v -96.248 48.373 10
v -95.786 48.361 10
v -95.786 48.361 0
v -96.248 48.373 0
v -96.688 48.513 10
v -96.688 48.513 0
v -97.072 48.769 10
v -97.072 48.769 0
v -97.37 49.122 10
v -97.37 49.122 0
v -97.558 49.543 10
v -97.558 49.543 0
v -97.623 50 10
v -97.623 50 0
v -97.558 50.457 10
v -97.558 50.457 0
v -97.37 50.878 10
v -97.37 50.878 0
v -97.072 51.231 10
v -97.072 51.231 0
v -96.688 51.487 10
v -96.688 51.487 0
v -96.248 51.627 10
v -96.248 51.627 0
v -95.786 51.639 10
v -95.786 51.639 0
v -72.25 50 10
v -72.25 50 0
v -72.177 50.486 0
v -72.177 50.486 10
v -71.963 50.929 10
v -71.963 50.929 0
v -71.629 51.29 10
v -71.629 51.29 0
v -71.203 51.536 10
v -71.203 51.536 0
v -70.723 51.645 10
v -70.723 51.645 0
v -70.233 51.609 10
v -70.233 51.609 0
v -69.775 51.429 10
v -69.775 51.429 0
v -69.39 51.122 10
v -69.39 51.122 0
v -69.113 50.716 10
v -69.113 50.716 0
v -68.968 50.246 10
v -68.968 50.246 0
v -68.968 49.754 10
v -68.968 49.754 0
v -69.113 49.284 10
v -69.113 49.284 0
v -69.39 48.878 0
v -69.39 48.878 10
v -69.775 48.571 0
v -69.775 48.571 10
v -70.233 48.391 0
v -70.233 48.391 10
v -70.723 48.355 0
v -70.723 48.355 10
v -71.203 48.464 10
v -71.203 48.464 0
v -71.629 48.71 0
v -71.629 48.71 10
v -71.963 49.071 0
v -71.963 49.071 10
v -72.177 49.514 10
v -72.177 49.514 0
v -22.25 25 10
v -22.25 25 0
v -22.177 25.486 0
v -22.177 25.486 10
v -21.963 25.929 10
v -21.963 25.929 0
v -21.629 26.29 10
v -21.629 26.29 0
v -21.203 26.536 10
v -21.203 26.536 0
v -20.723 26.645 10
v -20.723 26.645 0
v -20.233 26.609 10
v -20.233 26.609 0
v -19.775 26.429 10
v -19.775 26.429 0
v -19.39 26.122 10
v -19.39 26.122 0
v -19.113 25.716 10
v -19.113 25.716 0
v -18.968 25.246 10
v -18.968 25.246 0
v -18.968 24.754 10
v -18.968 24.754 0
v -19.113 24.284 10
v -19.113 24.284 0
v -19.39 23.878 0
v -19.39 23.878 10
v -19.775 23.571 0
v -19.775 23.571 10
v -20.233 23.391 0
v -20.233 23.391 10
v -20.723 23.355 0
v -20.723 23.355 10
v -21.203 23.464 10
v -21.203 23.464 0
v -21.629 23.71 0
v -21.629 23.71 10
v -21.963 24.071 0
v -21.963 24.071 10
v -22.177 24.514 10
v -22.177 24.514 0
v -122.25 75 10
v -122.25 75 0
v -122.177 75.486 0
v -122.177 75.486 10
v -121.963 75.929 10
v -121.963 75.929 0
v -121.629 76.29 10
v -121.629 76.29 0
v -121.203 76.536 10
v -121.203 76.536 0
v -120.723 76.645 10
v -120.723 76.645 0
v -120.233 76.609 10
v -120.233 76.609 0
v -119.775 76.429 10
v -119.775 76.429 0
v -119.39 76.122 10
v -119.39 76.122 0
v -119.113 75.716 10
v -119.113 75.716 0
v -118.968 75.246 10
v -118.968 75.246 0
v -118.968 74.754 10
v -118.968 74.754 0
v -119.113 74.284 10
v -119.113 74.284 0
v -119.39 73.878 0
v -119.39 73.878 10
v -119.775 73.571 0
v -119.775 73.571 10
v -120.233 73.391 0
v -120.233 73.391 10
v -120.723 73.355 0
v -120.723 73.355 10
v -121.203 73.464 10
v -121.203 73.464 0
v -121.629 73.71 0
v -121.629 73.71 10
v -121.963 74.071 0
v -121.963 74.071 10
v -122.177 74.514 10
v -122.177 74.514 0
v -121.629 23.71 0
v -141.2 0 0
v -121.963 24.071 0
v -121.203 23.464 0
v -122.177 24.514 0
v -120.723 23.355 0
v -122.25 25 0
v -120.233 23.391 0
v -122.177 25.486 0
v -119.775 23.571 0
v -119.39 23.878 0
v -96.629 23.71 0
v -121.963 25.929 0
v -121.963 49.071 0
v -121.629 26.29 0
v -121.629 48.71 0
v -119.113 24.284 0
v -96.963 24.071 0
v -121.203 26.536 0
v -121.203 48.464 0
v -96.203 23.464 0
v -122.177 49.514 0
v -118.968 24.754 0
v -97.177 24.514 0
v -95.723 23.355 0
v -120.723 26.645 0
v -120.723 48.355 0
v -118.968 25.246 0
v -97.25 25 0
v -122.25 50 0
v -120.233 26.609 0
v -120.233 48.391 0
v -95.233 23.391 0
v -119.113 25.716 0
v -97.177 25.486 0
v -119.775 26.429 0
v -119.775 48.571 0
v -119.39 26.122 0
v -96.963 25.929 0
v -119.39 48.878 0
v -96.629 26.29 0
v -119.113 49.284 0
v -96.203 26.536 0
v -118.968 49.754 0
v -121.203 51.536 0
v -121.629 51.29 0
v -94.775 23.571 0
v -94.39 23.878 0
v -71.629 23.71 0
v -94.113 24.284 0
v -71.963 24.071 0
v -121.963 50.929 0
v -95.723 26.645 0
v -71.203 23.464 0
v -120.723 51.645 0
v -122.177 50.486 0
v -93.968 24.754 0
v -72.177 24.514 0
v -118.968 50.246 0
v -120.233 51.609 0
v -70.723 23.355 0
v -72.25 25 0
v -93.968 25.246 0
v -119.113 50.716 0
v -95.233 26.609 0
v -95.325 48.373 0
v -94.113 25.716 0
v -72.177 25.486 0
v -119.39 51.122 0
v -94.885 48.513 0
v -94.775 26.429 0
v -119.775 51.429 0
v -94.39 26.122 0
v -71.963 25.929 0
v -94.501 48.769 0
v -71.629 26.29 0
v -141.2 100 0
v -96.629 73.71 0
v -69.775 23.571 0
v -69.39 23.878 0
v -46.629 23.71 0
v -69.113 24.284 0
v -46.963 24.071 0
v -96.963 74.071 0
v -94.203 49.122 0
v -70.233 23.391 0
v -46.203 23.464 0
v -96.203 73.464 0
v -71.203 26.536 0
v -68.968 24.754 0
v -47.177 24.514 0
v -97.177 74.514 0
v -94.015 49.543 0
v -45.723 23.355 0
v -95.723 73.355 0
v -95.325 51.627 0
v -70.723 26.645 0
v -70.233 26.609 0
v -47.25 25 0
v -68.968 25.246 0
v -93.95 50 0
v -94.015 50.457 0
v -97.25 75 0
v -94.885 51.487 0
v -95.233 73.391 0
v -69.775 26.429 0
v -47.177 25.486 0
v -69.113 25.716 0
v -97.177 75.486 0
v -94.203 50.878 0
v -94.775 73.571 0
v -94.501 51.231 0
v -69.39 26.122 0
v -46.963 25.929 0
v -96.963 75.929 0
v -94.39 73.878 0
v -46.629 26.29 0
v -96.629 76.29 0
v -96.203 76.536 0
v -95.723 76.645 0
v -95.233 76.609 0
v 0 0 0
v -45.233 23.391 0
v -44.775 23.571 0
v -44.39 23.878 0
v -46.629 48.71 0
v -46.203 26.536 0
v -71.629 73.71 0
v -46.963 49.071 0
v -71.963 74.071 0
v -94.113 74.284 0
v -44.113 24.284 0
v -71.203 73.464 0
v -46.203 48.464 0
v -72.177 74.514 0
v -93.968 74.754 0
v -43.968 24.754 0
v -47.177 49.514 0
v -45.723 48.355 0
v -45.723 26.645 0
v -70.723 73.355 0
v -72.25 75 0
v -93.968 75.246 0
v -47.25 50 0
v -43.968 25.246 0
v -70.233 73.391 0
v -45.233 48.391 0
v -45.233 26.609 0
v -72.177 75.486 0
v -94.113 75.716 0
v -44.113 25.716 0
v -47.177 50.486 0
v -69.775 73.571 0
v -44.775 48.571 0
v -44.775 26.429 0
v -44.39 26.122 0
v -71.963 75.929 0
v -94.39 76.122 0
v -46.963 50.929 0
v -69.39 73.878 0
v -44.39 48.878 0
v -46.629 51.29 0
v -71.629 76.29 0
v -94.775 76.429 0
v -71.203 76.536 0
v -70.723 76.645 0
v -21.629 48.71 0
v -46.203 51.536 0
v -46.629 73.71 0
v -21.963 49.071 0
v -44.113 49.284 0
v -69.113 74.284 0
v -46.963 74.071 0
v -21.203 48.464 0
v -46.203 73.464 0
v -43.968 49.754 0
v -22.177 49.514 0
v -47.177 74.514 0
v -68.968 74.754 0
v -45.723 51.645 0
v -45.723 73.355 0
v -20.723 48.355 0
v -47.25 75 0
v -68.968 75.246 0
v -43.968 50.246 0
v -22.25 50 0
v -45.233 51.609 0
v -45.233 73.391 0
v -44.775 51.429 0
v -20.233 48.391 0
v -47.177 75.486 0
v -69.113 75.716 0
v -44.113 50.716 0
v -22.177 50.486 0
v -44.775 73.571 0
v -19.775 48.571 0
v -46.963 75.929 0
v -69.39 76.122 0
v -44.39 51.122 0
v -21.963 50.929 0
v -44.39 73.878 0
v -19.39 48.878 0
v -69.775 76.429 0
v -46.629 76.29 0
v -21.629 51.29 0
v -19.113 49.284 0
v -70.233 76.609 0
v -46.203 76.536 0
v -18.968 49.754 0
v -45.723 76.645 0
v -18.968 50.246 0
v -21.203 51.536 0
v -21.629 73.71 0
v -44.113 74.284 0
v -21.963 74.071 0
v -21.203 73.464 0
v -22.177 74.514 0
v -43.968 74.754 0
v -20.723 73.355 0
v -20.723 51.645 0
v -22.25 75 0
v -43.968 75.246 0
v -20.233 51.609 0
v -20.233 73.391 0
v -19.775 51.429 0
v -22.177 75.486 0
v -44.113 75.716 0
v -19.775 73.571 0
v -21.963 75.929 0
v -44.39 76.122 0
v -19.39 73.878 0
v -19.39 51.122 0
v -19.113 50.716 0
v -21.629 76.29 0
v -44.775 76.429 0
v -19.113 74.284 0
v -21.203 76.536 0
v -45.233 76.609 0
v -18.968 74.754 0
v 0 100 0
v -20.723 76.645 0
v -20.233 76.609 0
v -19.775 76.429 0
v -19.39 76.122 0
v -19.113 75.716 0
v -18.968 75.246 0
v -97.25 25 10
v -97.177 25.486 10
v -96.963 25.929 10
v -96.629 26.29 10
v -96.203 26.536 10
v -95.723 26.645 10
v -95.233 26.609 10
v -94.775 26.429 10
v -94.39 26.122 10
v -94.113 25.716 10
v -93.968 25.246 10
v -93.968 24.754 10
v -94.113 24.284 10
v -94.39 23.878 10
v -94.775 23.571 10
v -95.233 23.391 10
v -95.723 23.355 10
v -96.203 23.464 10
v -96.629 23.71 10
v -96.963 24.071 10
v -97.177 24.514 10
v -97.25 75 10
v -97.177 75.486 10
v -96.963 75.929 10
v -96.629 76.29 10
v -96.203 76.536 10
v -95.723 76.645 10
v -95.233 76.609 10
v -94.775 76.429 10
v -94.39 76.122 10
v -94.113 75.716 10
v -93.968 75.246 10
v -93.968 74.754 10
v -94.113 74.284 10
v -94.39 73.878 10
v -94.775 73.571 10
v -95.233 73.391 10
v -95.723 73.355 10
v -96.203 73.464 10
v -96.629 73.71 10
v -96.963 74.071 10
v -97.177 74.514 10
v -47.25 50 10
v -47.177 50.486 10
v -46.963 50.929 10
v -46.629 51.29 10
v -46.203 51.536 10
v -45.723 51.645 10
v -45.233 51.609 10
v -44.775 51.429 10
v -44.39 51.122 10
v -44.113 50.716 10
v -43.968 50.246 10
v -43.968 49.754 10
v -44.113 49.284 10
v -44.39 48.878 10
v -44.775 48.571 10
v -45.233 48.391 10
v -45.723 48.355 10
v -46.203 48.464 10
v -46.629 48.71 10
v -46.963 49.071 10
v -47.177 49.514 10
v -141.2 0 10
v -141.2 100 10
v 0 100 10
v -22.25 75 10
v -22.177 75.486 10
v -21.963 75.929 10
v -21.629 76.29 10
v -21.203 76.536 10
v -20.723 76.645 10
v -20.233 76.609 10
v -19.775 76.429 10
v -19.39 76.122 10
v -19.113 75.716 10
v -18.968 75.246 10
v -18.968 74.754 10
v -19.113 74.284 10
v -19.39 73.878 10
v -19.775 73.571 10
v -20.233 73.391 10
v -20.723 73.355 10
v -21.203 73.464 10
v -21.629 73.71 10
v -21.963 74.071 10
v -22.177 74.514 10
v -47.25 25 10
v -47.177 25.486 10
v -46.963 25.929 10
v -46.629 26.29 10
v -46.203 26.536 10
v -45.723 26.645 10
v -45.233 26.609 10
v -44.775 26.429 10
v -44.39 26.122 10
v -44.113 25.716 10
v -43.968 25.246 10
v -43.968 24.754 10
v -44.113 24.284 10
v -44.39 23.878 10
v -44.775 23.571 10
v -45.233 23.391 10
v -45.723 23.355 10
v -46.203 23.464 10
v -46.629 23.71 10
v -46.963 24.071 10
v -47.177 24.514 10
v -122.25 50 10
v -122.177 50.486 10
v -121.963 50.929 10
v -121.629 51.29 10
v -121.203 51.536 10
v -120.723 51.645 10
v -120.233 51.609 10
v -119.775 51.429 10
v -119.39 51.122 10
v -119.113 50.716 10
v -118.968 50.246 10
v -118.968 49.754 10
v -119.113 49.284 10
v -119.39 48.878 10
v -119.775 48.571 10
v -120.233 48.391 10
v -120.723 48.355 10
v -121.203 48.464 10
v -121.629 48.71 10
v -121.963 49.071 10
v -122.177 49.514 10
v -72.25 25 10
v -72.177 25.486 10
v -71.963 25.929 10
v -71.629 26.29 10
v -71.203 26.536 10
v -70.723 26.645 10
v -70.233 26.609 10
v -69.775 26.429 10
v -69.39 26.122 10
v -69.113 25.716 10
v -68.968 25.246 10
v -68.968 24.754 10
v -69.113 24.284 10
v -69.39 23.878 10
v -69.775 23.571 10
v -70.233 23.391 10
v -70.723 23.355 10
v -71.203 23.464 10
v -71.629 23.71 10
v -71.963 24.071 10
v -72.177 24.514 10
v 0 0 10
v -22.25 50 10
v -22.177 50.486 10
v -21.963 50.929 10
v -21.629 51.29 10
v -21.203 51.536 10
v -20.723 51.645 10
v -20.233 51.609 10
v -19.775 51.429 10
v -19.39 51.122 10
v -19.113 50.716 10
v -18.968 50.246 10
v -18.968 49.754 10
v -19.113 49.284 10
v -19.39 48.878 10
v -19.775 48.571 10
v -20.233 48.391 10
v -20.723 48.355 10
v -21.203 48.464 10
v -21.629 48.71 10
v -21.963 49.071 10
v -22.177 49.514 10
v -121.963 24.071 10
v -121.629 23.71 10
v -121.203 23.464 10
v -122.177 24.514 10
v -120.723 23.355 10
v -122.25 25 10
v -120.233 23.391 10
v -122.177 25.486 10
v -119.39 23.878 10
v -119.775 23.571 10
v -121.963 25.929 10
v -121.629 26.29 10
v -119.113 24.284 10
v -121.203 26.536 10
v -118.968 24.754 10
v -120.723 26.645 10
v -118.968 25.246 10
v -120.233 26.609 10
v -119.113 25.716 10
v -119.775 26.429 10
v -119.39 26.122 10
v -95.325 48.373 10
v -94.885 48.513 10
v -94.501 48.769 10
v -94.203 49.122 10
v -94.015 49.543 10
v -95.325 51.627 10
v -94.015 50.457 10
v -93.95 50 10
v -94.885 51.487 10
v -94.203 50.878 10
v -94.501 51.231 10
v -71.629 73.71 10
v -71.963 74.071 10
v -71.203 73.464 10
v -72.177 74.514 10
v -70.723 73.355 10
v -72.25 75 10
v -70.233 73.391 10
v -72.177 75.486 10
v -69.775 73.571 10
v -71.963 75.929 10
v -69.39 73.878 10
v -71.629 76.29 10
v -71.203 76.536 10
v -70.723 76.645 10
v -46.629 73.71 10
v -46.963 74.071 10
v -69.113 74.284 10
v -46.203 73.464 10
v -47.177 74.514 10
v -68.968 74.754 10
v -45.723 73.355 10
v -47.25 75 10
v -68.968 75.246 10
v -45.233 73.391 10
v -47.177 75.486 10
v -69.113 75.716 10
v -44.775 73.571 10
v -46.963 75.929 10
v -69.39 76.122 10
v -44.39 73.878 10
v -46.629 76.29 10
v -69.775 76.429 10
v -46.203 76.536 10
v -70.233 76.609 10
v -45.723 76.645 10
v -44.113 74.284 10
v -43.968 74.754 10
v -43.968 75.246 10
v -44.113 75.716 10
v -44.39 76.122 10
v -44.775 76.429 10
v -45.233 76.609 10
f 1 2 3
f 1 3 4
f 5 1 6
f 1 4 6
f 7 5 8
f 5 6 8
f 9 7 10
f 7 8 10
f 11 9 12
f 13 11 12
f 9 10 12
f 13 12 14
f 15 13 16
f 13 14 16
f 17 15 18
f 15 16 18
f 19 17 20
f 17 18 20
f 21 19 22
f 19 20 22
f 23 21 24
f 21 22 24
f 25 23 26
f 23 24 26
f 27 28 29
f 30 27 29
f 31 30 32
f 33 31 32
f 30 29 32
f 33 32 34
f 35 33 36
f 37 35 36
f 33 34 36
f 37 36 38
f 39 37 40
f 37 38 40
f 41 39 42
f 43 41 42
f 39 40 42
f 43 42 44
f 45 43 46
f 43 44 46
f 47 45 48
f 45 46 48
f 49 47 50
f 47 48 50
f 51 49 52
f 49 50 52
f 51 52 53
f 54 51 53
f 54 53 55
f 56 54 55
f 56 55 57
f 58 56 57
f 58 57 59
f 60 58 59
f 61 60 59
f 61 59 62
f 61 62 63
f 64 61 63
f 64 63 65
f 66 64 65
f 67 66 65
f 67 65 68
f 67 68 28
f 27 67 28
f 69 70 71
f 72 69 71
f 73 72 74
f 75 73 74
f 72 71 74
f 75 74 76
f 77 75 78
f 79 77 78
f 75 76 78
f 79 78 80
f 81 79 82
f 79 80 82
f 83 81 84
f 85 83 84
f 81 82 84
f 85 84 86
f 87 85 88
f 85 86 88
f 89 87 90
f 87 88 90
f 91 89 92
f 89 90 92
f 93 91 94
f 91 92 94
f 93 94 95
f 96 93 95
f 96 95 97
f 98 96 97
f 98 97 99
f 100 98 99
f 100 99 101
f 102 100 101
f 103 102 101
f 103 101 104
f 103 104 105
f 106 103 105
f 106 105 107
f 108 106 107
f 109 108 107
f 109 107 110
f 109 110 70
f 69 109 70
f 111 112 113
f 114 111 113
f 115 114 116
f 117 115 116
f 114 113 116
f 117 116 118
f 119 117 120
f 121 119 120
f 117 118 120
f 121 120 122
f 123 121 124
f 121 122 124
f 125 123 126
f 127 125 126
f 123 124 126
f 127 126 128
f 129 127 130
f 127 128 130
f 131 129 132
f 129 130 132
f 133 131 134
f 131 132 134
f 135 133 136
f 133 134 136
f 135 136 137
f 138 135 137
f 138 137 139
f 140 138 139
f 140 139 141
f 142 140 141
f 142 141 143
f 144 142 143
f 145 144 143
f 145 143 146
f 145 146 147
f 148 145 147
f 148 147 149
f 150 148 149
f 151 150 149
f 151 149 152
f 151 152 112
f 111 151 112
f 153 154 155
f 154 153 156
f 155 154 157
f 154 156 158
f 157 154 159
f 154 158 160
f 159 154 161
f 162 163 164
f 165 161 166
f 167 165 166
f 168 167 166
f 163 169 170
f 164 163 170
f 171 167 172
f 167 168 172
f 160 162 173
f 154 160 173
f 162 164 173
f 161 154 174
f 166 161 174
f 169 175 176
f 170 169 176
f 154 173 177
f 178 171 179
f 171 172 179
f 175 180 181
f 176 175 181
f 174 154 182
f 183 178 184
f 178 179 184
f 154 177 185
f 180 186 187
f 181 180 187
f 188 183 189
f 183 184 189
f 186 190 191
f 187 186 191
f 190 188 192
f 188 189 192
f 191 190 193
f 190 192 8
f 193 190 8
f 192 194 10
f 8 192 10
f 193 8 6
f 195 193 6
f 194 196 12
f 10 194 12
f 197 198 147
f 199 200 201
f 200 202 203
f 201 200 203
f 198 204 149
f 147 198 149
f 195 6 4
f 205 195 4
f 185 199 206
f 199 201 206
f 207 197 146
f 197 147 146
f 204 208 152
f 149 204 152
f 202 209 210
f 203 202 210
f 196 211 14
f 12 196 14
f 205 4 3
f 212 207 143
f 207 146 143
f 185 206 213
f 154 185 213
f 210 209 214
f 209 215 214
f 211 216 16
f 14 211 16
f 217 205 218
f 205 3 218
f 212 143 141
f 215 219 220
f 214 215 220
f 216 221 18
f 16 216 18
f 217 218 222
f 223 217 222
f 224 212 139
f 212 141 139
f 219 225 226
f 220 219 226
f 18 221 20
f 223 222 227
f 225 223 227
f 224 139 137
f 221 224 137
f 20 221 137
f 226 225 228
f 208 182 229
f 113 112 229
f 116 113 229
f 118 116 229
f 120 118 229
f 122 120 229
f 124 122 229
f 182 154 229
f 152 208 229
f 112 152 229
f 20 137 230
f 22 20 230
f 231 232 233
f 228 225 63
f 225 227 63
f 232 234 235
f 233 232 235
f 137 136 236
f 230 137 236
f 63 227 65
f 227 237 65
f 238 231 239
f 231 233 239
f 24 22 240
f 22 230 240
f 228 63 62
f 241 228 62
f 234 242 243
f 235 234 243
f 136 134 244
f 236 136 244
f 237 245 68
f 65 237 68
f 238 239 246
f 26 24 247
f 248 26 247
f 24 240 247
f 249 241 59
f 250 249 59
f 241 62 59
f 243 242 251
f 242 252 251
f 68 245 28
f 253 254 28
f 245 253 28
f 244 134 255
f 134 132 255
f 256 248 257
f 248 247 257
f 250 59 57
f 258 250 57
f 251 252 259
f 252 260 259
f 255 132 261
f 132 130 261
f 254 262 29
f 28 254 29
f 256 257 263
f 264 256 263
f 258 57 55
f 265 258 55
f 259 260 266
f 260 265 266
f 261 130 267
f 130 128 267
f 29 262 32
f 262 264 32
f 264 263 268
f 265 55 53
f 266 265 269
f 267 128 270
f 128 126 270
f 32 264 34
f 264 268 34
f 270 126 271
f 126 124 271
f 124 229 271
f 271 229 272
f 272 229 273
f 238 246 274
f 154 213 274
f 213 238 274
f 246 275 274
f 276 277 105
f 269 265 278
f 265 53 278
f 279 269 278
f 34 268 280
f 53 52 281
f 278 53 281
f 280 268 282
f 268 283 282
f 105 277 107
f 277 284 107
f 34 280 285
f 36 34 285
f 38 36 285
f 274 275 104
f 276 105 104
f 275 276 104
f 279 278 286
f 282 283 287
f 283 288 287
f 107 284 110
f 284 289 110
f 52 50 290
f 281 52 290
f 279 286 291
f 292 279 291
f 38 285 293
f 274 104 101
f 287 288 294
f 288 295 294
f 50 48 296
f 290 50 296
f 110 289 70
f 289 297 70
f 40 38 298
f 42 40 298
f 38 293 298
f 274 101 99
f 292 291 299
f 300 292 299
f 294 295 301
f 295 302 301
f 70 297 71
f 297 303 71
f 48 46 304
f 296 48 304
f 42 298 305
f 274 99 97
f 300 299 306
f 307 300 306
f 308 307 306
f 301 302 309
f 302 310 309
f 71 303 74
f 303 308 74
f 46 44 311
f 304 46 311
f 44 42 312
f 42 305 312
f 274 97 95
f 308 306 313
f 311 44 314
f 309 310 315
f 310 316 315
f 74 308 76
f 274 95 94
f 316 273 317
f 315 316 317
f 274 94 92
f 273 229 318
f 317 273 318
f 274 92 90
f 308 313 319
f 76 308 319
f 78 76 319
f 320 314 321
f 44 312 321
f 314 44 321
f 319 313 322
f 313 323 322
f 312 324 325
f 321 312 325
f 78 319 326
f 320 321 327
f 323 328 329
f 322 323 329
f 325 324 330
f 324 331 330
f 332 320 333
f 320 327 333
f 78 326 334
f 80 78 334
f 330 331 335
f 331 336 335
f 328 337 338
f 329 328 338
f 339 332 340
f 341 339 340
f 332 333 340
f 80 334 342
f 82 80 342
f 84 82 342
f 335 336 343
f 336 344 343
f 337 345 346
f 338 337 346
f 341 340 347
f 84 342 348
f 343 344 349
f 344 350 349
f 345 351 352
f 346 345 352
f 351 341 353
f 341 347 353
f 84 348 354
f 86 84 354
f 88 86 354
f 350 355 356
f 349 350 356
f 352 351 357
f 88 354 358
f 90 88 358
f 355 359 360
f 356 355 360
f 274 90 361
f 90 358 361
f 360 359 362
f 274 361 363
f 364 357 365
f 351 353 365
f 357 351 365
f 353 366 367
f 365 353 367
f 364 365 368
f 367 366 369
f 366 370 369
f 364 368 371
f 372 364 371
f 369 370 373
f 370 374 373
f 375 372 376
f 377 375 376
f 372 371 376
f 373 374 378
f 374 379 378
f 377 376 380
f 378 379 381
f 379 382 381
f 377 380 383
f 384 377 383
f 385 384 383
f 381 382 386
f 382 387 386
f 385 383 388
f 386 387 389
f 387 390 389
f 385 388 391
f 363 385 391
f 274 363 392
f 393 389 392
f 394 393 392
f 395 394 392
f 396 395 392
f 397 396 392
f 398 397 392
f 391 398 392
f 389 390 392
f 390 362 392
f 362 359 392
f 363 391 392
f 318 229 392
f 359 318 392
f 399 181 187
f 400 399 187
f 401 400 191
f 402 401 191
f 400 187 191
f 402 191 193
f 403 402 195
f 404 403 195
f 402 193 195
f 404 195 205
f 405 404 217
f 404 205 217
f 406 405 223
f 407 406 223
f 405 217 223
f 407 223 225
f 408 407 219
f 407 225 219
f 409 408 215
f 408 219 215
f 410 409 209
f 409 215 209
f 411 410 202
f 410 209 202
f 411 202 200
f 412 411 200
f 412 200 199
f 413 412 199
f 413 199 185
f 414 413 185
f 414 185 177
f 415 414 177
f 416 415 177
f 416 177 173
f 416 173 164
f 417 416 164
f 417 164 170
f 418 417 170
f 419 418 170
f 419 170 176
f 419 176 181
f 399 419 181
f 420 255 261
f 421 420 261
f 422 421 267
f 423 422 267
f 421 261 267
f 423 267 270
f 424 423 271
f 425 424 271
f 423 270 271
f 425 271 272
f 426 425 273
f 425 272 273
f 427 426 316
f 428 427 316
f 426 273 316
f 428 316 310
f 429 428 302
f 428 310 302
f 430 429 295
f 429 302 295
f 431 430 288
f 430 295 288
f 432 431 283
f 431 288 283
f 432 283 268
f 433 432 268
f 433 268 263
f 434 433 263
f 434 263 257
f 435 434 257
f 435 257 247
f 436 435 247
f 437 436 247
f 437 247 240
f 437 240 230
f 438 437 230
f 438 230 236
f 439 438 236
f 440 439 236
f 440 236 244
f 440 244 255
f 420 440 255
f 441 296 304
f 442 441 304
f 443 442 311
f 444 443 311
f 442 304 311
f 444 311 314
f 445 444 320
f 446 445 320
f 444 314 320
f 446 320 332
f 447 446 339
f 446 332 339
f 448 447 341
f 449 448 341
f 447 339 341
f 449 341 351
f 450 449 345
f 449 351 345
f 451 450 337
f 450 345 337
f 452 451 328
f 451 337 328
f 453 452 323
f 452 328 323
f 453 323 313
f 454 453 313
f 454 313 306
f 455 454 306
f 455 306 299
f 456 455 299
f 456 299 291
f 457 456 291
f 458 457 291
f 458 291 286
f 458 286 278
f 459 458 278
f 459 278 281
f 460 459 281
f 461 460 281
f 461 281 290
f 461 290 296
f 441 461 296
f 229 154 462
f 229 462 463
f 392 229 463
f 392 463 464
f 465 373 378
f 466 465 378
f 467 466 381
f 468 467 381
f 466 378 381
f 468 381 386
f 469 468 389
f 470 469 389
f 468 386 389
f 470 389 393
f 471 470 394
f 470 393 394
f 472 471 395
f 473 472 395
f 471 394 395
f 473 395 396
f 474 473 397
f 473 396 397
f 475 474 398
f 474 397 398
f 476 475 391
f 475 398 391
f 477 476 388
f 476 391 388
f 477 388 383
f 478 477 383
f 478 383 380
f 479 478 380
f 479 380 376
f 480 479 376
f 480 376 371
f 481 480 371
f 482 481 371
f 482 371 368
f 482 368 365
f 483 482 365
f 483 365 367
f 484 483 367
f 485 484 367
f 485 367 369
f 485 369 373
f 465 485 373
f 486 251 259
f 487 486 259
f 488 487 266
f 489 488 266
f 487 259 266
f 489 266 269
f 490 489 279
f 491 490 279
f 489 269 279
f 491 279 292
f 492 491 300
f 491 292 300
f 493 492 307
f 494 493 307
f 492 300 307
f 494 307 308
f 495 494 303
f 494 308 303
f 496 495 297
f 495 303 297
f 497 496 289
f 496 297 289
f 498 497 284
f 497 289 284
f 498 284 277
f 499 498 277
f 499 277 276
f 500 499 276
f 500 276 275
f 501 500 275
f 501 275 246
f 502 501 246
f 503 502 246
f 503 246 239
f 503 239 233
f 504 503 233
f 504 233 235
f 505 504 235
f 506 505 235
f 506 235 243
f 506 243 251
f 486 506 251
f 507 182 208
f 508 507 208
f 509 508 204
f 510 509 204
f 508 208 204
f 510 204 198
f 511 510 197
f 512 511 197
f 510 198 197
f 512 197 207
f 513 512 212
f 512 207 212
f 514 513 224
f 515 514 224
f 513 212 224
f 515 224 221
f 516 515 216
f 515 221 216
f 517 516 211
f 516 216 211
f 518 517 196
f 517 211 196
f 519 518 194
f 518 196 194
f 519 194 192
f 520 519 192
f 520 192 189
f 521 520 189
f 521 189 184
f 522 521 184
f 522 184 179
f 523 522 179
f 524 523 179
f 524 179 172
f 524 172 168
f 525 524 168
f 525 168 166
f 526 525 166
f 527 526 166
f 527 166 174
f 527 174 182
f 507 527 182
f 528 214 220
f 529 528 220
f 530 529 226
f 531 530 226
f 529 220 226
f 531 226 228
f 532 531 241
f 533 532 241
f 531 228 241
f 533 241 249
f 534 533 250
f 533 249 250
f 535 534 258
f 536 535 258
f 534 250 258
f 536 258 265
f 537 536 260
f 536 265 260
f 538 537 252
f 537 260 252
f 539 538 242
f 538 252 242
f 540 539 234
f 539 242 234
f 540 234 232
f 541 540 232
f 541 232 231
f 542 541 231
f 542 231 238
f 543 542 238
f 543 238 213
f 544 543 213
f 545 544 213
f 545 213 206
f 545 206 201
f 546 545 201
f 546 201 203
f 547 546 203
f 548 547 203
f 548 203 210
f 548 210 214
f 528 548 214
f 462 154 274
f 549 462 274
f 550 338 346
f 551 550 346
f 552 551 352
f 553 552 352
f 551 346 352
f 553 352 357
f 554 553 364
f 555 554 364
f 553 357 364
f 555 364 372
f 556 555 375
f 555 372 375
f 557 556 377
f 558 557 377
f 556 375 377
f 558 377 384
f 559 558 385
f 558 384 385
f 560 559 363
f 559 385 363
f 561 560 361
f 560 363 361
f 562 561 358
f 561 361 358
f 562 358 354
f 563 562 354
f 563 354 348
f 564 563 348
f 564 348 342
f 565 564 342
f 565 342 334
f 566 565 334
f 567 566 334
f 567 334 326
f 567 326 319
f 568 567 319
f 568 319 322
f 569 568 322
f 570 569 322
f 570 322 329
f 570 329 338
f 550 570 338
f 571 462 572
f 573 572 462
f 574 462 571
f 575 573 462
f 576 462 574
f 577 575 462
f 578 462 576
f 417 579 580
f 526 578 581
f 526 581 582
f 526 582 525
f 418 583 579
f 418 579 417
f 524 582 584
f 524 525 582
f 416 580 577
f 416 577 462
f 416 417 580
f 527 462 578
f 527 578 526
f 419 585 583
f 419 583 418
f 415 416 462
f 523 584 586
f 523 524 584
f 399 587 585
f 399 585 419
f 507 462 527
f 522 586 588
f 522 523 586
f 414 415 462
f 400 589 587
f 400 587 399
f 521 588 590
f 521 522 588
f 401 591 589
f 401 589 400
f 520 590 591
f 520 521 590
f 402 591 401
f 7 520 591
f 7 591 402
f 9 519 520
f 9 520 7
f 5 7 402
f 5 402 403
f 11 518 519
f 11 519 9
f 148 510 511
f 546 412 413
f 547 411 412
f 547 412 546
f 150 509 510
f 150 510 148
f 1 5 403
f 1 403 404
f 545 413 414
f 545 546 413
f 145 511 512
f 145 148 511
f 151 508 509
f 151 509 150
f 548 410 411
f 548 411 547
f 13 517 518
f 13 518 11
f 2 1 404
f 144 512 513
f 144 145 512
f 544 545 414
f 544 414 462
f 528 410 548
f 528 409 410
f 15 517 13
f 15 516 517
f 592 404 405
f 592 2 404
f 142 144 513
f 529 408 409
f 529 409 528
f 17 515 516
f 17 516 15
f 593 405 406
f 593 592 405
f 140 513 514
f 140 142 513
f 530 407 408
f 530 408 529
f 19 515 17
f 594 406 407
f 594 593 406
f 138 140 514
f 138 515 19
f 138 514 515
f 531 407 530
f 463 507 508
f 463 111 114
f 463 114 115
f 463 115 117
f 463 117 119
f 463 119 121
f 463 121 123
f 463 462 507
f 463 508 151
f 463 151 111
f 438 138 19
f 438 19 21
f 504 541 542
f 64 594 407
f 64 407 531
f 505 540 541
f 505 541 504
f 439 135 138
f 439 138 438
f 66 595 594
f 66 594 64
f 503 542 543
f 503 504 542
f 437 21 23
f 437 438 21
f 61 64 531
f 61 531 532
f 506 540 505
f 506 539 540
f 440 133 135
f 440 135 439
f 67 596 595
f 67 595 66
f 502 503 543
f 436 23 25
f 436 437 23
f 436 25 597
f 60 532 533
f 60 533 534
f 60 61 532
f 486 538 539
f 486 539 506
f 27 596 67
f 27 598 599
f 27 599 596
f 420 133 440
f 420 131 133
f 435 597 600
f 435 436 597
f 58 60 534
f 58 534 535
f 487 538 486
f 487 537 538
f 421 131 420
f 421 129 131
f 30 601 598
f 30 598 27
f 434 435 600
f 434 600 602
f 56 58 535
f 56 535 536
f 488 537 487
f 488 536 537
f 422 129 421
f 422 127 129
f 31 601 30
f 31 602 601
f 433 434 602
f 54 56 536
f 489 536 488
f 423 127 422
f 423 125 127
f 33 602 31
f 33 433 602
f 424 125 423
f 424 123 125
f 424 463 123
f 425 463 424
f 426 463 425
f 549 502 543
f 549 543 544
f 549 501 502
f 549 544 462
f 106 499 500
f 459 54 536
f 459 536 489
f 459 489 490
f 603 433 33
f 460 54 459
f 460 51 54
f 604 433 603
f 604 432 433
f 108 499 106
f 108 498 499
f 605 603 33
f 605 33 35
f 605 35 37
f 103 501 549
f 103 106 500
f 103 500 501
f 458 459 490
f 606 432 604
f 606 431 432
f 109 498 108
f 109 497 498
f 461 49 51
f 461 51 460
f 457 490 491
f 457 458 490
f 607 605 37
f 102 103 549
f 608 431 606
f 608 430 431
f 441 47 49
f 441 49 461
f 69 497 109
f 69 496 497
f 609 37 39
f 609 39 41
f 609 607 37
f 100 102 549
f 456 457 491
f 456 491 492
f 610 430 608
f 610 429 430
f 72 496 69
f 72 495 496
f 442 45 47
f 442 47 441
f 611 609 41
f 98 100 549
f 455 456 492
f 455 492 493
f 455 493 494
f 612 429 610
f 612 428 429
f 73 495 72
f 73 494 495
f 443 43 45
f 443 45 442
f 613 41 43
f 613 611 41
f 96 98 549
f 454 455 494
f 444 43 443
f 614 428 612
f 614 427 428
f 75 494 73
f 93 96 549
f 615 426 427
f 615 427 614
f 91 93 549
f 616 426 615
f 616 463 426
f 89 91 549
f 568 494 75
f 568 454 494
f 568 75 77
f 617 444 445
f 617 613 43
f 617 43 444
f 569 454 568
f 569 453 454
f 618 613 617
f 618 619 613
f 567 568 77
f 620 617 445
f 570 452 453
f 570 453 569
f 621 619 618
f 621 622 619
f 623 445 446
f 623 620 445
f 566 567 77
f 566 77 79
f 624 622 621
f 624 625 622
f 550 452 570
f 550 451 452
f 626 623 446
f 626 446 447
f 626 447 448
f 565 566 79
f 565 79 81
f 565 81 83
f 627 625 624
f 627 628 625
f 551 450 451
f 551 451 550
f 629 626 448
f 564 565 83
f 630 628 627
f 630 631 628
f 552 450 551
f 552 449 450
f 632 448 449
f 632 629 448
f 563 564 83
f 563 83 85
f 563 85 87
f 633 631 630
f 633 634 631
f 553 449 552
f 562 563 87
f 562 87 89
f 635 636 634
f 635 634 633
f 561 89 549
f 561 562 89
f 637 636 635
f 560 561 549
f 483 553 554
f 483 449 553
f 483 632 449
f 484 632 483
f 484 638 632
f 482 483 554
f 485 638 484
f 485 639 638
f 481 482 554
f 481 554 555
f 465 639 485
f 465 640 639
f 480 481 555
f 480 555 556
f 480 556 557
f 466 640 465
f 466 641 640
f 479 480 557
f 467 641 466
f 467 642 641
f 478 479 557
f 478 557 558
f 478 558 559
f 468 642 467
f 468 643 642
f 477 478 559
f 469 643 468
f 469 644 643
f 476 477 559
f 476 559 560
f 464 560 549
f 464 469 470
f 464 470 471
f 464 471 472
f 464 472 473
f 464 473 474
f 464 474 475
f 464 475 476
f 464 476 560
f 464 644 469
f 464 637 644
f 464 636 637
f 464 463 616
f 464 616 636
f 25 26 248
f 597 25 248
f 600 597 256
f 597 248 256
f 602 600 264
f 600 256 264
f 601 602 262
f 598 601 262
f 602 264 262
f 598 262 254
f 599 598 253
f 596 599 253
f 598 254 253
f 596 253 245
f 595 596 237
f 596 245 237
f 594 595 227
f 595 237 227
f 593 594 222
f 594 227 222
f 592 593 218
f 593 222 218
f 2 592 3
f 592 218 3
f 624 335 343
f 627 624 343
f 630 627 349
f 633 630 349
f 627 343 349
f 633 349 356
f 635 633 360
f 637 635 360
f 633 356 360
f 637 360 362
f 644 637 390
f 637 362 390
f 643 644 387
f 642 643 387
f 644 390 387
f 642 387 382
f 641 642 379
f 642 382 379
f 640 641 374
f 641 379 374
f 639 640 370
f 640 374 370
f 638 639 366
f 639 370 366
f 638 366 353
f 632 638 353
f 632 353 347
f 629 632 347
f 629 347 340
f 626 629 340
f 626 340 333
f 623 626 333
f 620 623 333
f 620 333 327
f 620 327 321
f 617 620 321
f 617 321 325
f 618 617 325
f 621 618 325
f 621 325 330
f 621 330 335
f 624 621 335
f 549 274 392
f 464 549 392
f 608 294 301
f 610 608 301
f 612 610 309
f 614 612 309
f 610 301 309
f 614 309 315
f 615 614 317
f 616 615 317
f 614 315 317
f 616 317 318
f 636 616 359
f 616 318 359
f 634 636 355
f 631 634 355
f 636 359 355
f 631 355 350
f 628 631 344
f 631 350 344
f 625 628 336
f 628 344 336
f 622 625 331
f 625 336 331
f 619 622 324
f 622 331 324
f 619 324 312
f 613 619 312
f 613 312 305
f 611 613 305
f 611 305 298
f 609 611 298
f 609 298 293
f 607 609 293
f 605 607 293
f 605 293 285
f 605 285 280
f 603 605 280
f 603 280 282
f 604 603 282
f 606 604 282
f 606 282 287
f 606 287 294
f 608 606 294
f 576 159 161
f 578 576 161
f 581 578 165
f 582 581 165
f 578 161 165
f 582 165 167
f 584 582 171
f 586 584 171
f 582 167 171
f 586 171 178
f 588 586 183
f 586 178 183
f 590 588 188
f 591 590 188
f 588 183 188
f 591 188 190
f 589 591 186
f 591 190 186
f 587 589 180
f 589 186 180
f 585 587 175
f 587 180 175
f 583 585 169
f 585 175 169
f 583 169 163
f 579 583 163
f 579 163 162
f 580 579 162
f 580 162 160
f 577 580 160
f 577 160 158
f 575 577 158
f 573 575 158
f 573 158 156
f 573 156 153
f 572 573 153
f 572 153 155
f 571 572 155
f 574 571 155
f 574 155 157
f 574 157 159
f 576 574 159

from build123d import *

# Parameters (mm, degrees)
SKETCH1_W             = 141.2
SKETCH1_H             = 100
BOSS_EXTRUDE1_DEPTH   = 10
M4X0_7_TAPPED_HOLE1_D = 3.3


with BuildPart() as part:
    # Sketch1 → Boss-Extrude1 (new body)
    with BuildSketch(Plane.XY):
        with Locations((-70.6, 50)):
            Rectangle(SKETCH1_W, SKETCH1_H)
    extrude(amount=BOSS_EXTRUDE1_DEPTH)

    # M4x0.7 Tapped Hole1 (through all)
    with Locations(Plane.XY.offset(10)):
        with Locations((-120.6, 75), (-70.6, 50), (-95.6, 50), (-20.6, 50), (-45.6, 50), (-95.972807971, 50), (-120.6, 50), (-20.6, 25), (-45.6, 25), (-70.6, 25), (-95.6, 25), (-120.6, 25), (-20.6, 75), (-45.6, 75), (-70.6, 75), (-95.6, 75)):
            Hole(M4X0_7_TAPPED_HOLE1_D / 2)


solid = part.part
